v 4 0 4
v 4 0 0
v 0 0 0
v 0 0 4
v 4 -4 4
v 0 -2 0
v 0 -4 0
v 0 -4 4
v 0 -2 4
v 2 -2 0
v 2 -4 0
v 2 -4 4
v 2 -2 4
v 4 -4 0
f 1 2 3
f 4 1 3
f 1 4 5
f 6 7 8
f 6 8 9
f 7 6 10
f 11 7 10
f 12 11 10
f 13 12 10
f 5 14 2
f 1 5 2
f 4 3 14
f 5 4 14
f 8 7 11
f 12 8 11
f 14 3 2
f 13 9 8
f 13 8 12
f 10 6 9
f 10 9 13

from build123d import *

# Parameters (mm, degrees)
BOSS_EXTRUDE1_DEPTH   = 4
SKETCH1_W             = 2
SKETCH1_H             = 2
BOSS_EXTRUDE1_2_DEPTH = 4


with BuildPart() as part:
    # Sketch1 → Boss-Extrude1 (new body)
    with BuildSketch(Plane.XY):
        Polygon((0, 0), (4, -4), (4, 0), align=None)
    extrude(amount=BOSS_EXTRUDE1_DEPTH)


with BuildPart() as body_2:
    # Sketch1 → Boss-Extrude1 2 (new body)
    with BuildSketch(Plane.XY):
        with Locations((1, -3)):
            Rectangle(SKETCH1_W, SKETCH1_H)
    extrude(amount=BOSS_EXTRUDE1_2_DEPTH)


solid = Compound([part.part, body_2.part])
